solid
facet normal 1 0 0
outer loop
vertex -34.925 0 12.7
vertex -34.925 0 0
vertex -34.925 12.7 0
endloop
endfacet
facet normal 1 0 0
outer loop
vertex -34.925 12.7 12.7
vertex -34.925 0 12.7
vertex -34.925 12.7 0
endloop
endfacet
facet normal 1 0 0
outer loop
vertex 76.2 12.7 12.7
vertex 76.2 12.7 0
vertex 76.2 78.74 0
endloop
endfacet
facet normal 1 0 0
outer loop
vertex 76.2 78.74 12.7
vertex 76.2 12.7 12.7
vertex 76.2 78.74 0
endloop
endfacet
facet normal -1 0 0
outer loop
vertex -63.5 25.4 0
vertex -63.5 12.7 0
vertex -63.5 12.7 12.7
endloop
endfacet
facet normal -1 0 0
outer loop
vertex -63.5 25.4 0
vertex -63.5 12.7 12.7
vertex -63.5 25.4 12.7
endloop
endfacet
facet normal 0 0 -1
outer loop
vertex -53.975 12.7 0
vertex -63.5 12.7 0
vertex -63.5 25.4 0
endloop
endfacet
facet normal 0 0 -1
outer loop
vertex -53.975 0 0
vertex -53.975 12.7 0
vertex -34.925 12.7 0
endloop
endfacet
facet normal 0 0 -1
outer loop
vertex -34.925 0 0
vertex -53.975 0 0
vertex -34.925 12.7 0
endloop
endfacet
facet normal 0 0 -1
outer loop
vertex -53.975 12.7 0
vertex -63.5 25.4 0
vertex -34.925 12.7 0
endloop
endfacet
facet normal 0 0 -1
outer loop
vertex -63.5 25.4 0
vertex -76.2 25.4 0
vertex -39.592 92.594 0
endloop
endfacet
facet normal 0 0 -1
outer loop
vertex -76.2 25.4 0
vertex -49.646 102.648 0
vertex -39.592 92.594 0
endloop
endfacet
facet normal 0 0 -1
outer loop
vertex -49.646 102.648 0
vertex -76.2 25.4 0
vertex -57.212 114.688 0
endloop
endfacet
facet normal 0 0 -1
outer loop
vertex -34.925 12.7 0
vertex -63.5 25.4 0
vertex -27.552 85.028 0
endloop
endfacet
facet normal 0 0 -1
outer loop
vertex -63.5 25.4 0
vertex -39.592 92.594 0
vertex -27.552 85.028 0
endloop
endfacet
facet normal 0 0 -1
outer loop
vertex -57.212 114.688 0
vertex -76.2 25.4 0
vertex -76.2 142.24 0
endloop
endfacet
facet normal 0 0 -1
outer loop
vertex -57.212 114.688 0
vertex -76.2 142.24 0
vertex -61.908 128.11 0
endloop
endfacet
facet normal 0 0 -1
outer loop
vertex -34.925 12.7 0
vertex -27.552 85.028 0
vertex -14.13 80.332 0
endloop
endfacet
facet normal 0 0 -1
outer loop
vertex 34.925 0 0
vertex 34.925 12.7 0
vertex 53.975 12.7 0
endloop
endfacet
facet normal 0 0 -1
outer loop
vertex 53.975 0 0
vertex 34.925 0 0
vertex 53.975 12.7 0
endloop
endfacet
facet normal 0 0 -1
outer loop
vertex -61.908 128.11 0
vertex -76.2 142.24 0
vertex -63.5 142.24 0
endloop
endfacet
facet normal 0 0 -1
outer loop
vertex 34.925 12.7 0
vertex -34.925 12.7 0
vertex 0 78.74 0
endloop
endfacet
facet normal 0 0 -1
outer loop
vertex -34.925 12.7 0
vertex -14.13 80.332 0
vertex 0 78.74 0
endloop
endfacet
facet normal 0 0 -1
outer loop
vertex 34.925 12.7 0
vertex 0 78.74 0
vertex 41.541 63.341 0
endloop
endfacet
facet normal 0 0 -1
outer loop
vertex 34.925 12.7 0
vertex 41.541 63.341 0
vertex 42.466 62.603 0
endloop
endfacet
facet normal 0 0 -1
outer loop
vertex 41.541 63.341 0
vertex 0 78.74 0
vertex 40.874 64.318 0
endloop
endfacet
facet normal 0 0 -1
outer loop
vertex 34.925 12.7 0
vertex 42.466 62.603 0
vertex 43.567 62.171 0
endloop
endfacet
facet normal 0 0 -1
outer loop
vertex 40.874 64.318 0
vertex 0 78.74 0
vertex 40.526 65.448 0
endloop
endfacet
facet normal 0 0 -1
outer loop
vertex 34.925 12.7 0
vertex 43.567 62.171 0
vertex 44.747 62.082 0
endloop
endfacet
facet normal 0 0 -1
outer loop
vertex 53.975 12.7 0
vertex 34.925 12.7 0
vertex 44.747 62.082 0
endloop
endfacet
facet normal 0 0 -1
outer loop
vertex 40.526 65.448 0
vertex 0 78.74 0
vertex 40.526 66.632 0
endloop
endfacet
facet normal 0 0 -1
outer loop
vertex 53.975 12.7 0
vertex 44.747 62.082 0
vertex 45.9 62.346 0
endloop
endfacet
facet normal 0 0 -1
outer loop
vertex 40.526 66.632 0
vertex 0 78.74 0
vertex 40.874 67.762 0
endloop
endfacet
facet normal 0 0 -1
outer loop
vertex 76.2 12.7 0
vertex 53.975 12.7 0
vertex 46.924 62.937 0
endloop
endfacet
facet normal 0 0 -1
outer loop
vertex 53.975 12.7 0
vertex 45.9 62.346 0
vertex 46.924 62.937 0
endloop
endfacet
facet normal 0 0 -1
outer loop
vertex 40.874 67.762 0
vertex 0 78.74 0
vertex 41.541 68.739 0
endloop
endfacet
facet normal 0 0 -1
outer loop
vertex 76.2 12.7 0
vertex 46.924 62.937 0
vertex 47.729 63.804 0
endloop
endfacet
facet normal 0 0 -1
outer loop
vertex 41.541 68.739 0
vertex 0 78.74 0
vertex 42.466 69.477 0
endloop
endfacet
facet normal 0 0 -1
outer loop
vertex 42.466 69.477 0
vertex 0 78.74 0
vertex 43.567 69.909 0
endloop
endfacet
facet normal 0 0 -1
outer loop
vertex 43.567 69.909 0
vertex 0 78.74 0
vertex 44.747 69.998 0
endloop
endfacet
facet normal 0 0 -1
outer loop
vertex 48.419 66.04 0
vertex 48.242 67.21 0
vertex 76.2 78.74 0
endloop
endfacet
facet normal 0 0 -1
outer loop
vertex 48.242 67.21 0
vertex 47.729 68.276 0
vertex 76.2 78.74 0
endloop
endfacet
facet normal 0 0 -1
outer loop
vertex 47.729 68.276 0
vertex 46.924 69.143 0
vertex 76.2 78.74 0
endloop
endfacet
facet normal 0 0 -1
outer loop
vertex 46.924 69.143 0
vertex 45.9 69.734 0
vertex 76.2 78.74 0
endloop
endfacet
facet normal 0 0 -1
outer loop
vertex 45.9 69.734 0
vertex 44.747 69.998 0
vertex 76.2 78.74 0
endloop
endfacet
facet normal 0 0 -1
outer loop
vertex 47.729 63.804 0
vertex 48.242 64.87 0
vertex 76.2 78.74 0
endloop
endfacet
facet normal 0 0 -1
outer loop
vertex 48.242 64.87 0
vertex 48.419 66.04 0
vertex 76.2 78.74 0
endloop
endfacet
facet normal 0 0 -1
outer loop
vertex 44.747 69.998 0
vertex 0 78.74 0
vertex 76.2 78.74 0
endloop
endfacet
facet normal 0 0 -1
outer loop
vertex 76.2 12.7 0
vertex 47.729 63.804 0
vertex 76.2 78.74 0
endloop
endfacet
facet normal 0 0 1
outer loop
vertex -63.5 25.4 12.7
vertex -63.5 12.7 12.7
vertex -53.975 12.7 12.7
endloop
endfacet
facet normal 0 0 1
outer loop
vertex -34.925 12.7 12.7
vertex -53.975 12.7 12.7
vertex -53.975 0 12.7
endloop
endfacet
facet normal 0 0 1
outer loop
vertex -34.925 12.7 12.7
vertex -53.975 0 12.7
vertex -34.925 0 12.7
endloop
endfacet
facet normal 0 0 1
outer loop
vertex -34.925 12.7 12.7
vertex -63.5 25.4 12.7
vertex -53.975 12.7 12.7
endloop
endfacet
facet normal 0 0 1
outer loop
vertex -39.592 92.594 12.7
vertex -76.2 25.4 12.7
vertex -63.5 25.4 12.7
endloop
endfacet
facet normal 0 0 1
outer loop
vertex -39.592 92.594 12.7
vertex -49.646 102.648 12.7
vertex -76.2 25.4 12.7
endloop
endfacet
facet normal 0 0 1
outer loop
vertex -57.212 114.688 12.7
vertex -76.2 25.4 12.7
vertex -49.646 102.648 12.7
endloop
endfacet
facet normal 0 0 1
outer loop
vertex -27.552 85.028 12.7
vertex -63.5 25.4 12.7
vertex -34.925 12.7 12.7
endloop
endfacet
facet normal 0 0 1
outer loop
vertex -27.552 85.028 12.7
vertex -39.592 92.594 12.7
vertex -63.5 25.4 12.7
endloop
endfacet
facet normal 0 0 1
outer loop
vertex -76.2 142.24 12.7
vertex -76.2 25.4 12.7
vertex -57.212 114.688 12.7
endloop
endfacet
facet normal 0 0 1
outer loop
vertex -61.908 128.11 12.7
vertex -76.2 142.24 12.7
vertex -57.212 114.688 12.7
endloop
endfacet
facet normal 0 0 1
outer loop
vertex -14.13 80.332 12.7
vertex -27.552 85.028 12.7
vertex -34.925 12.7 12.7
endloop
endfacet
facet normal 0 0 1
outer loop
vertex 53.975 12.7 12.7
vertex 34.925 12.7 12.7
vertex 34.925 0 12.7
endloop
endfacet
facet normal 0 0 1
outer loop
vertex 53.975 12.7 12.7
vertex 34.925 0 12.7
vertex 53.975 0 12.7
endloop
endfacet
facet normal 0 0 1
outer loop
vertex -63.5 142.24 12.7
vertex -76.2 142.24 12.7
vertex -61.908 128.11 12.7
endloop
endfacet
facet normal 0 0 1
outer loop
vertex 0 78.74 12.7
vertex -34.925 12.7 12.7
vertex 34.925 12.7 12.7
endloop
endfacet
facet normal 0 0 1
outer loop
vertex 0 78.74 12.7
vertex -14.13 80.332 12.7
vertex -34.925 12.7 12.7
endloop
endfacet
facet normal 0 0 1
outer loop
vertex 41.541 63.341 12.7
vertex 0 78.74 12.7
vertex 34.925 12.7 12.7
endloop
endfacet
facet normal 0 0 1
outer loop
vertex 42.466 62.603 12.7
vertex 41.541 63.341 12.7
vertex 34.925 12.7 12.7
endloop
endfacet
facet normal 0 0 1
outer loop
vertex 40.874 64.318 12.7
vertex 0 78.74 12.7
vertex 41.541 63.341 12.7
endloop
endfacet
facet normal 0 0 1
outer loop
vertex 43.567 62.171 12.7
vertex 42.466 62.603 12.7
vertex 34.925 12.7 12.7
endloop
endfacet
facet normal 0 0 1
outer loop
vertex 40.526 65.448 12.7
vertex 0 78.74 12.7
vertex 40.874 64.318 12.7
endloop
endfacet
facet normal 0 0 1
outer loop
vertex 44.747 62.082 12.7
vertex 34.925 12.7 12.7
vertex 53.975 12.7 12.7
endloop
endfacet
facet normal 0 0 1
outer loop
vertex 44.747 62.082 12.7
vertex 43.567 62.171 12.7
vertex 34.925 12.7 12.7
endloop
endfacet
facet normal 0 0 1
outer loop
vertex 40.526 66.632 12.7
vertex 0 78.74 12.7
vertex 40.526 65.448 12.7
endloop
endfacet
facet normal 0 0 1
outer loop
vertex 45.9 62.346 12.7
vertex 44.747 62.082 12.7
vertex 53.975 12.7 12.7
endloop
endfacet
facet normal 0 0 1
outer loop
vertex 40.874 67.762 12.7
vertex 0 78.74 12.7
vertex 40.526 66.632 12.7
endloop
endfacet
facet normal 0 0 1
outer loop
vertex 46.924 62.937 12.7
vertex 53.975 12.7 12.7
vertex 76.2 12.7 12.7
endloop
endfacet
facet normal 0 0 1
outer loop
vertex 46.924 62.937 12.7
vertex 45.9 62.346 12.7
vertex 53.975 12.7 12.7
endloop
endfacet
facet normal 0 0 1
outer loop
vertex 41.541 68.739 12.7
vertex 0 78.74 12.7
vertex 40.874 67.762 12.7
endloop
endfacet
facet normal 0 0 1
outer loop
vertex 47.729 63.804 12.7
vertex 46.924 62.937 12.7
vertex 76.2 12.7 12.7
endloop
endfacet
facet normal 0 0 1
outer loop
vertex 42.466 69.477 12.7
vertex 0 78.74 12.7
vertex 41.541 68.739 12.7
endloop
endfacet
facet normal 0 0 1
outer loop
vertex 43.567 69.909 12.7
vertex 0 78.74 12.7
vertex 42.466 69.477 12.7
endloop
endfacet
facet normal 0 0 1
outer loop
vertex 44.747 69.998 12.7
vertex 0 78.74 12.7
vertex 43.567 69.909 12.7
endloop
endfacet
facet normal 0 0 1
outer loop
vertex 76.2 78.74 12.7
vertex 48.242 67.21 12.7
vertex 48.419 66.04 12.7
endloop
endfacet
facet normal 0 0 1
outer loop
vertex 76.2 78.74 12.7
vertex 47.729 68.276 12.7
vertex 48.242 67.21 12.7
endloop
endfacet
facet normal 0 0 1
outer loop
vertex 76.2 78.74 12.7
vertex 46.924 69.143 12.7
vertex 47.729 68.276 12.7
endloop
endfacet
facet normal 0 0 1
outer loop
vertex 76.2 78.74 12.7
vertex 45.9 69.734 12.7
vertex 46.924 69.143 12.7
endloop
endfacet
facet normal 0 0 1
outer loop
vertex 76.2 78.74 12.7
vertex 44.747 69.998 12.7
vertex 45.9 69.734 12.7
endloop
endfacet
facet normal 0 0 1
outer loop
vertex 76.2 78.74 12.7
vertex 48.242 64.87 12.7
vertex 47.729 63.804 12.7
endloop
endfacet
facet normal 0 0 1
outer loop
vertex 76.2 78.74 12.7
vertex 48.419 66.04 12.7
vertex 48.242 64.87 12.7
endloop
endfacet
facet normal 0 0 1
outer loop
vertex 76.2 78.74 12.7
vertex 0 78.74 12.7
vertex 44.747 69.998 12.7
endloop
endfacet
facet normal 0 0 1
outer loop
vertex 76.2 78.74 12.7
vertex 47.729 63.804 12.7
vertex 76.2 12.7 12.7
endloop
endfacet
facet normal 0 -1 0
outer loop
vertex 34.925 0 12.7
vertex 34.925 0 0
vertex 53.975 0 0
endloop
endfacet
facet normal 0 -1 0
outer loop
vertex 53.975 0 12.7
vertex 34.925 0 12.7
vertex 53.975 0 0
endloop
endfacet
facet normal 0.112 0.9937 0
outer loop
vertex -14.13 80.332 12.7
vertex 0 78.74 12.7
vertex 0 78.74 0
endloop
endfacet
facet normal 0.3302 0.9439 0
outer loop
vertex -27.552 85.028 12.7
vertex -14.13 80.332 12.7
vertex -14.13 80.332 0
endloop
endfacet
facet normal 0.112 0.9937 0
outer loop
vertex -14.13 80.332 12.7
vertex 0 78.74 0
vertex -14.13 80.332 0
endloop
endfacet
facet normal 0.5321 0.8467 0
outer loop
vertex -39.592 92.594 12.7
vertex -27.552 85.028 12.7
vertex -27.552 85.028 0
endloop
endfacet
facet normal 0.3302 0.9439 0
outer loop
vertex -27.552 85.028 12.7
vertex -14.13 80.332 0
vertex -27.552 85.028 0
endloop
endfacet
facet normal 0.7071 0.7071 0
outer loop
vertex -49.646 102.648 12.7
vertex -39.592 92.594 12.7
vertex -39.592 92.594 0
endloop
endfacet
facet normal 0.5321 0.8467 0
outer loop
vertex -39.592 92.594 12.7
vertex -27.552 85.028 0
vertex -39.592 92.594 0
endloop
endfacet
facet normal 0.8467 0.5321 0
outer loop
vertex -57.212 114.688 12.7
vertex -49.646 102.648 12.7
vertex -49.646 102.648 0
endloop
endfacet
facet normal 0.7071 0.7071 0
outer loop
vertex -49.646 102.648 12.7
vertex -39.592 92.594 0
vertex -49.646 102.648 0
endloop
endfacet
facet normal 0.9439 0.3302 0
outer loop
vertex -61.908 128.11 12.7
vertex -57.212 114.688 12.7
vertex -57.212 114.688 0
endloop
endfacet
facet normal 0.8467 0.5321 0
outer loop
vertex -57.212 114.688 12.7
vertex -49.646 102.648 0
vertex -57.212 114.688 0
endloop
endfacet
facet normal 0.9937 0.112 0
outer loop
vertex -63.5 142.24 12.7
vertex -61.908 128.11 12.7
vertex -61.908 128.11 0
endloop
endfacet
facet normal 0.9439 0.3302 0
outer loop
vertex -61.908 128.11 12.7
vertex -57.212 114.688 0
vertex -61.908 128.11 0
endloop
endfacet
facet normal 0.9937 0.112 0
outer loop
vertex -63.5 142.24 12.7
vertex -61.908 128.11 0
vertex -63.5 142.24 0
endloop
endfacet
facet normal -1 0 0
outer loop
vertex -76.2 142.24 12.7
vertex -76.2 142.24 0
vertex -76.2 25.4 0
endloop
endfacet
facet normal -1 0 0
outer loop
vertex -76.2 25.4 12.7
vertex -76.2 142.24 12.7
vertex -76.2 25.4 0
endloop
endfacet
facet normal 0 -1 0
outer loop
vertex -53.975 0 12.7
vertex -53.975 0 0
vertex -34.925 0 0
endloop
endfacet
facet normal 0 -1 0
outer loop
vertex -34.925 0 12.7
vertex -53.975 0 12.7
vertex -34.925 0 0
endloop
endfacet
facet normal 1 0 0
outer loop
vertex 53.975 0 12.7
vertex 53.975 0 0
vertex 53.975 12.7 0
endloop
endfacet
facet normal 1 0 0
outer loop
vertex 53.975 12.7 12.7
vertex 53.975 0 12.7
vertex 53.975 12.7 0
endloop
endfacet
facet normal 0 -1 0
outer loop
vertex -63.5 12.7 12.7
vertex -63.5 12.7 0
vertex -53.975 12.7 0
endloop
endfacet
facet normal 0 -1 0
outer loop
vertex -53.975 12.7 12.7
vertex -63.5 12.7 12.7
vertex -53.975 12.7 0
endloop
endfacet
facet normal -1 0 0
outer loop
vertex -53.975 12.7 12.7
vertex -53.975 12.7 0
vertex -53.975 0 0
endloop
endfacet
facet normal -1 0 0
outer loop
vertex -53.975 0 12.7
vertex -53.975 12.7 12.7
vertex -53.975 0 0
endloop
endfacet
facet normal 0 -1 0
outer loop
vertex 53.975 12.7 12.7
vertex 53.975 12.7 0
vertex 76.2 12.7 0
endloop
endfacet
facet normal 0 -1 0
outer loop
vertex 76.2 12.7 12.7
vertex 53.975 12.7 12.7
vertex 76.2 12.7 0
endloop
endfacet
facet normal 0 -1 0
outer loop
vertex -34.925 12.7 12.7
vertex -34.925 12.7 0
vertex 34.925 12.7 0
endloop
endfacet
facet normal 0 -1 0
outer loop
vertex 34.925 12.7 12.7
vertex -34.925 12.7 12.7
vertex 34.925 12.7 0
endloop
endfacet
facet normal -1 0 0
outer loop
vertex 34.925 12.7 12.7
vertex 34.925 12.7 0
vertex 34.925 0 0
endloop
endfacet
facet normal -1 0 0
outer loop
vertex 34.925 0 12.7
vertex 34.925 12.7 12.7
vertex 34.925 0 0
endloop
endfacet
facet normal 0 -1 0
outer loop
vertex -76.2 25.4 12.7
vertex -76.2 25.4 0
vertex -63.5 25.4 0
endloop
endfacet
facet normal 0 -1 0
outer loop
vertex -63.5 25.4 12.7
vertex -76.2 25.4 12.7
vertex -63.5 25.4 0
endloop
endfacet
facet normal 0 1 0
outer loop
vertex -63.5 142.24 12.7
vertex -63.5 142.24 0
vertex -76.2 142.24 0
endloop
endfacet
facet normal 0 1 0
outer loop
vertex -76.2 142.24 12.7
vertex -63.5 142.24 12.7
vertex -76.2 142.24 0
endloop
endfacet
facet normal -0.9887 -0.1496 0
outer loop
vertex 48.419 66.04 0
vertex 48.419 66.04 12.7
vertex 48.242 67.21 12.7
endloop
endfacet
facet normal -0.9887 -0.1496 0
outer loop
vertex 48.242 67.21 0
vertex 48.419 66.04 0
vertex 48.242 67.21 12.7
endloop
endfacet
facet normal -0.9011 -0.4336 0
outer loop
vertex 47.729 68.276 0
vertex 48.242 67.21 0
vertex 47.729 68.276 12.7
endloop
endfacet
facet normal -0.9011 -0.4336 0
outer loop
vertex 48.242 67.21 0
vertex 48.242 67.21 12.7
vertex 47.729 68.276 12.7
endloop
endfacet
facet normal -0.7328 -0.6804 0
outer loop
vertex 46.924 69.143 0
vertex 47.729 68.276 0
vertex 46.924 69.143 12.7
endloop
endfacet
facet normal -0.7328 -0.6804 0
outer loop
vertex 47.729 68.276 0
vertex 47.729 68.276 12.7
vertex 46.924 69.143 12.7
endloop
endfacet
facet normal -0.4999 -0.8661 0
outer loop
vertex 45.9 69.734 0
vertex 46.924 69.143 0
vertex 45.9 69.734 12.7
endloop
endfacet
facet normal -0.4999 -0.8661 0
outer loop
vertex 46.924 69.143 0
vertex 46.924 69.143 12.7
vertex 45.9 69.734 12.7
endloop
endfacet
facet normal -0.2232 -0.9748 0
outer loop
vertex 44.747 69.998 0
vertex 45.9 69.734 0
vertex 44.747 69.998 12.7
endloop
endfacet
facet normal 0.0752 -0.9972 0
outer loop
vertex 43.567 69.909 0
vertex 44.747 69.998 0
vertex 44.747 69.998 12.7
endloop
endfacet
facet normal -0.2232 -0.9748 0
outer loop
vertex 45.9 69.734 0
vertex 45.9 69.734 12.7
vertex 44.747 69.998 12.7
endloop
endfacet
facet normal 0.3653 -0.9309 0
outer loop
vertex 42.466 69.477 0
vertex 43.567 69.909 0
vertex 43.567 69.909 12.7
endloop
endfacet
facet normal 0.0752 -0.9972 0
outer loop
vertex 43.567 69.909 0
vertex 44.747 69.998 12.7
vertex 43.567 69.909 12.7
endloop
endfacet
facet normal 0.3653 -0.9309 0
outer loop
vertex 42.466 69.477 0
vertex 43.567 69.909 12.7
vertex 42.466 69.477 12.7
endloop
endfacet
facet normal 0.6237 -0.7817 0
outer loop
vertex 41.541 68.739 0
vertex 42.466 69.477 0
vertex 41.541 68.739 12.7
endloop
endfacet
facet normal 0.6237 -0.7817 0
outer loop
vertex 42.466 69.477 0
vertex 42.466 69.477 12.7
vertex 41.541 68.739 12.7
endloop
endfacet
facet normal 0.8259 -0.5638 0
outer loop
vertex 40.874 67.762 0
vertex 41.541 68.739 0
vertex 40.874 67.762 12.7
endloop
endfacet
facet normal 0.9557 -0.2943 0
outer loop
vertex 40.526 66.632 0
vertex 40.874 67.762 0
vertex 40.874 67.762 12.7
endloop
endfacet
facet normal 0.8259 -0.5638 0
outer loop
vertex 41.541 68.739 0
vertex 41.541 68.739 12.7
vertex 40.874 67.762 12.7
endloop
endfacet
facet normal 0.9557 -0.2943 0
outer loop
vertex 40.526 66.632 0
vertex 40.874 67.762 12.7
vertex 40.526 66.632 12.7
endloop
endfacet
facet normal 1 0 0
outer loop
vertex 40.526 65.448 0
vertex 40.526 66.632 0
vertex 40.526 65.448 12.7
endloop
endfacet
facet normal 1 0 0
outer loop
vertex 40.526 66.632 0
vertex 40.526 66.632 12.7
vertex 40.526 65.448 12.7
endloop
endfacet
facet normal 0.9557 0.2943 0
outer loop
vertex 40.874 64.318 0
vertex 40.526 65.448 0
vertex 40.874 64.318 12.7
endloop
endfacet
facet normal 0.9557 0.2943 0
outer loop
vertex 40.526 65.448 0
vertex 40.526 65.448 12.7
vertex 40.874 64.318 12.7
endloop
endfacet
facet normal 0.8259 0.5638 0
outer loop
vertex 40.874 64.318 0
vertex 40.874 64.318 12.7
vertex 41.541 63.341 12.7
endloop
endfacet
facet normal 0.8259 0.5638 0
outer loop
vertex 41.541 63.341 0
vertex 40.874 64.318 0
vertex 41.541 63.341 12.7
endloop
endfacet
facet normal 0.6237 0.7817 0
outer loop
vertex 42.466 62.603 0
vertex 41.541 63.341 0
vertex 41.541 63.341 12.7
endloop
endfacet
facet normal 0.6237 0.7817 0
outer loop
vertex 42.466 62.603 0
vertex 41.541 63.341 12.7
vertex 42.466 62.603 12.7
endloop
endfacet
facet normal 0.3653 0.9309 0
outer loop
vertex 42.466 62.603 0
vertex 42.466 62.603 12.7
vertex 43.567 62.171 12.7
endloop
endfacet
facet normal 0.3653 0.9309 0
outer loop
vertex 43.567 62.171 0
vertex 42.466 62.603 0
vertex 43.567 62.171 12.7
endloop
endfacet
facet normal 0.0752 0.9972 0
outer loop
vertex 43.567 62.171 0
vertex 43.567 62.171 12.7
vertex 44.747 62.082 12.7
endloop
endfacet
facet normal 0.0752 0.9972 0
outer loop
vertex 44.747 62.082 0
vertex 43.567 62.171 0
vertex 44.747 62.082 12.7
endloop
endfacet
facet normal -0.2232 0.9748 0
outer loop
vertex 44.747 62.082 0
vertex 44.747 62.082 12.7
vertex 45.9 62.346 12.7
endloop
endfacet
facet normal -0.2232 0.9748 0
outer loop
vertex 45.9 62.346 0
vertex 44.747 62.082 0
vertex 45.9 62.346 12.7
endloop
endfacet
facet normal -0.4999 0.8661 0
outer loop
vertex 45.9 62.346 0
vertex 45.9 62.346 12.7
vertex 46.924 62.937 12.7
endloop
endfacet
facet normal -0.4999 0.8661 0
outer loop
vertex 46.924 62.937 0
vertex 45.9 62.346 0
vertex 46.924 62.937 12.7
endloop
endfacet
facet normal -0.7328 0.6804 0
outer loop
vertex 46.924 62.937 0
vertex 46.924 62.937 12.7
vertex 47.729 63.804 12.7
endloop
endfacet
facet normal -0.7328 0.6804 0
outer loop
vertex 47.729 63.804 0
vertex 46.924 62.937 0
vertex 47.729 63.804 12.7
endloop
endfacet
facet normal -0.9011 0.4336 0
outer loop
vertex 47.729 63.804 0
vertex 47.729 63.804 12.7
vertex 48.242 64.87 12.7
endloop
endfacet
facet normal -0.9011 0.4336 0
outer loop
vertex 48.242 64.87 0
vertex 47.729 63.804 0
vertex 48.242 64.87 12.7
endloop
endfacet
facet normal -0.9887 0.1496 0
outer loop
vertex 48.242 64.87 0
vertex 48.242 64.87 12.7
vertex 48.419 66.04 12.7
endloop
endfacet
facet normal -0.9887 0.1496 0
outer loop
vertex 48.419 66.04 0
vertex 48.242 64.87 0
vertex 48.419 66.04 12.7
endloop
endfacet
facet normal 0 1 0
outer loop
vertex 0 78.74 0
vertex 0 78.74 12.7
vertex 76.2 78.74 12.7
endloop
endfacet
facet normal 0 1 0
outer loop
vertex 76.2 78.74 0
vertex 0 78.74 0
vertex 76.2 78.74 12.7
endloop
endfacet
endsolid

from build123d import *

# Parameters (mm, degrees)
EXTRUDE1_DEPTH     = 12.7
SKETCH2_R          = 3.96875
CUT_EXTRUDE1_DEPTH = 162.863978698
SKETCH3_W          = 12.7
SKETCH3_H          = 12.7
EXTRUDE2_DEPTH     = 162.863978698
SKETCH4_W          = 105.983052191
SKETCH4_H          = 75.202262717
EXTRUDE3_DEPTH     = 162.863978698


with BuildPart() as part:
    # Sketch1 → Extrude1 (new body)
    with BuildSketch(Plane.XY):
        with BuildLine():
            Line((-76.2, 12.7), (-53.975, 12.7))
            Line((-53.975, 12.7), (-53.975, 0))
            Line((-53.975, 0), (-34.925, 0))
            Line((-34.925, 0), (-34.925, 12.7))
            Line((-34.925, 12.7), (34.925, 12.7))
            Line((34.925, 12.7), (34.925, 0))
            Line((34.925, 0), (53.975, 0))
            Line((53.975, 0), (53.975, 12.7))
            Line((53.975, 12.7), (76.2, 12.7))
            Line((76.2, 12.7), (76.2, 142.24))
            Line((76.2, 142.24), (63.5, 142.24))
            ThreePointArc((63.5, 142.24), (0, 78.74), (-63.5, 142.24))
            Line((-63.5, 142.24), (-76.2, 142.24))
            Line((-76.2, 142.24), (-76.2, 12.7))
        make_face()
    extrude(amount=EXTRUDE1_DEPTH)

    # Sketch2 → Cut-Extrude1 (cut, through all)
    with BuildSketch(Plane.XY.offset(12.7)):
        with Locations((44.45, 66.04)):
            Circle(SKETCH2_R)
    extrude(amount=-CUT_EXTRUDE1_DEPTH, mode=Mode.SUBTRACT)

    # Sketch3 → Extrude2 (cut, through all)
    with BuildSketch(Plane.XY.offset(12.7)):
        with Locations((-69.85, 19.05)):
            Rectangle(SKETCH3_W, SKETCH3_H)
    extrude(amount=-EXTRUDE2_DEPTH, mode=Mode.SUBTRACT)

    # Sketch4 → Extrude3 (cut, through all)
    with BuildSketch(Plane.XY.offset(12.7)):
        with Locations((52.991526096, 116.341131359)):
            Rectangle(SKETCH4_W, SKETCH4_H)
    extrude(amount=-EXTRUDE3_DEPTH, mode=Mode.SUBTRACT)


solid = part.part
